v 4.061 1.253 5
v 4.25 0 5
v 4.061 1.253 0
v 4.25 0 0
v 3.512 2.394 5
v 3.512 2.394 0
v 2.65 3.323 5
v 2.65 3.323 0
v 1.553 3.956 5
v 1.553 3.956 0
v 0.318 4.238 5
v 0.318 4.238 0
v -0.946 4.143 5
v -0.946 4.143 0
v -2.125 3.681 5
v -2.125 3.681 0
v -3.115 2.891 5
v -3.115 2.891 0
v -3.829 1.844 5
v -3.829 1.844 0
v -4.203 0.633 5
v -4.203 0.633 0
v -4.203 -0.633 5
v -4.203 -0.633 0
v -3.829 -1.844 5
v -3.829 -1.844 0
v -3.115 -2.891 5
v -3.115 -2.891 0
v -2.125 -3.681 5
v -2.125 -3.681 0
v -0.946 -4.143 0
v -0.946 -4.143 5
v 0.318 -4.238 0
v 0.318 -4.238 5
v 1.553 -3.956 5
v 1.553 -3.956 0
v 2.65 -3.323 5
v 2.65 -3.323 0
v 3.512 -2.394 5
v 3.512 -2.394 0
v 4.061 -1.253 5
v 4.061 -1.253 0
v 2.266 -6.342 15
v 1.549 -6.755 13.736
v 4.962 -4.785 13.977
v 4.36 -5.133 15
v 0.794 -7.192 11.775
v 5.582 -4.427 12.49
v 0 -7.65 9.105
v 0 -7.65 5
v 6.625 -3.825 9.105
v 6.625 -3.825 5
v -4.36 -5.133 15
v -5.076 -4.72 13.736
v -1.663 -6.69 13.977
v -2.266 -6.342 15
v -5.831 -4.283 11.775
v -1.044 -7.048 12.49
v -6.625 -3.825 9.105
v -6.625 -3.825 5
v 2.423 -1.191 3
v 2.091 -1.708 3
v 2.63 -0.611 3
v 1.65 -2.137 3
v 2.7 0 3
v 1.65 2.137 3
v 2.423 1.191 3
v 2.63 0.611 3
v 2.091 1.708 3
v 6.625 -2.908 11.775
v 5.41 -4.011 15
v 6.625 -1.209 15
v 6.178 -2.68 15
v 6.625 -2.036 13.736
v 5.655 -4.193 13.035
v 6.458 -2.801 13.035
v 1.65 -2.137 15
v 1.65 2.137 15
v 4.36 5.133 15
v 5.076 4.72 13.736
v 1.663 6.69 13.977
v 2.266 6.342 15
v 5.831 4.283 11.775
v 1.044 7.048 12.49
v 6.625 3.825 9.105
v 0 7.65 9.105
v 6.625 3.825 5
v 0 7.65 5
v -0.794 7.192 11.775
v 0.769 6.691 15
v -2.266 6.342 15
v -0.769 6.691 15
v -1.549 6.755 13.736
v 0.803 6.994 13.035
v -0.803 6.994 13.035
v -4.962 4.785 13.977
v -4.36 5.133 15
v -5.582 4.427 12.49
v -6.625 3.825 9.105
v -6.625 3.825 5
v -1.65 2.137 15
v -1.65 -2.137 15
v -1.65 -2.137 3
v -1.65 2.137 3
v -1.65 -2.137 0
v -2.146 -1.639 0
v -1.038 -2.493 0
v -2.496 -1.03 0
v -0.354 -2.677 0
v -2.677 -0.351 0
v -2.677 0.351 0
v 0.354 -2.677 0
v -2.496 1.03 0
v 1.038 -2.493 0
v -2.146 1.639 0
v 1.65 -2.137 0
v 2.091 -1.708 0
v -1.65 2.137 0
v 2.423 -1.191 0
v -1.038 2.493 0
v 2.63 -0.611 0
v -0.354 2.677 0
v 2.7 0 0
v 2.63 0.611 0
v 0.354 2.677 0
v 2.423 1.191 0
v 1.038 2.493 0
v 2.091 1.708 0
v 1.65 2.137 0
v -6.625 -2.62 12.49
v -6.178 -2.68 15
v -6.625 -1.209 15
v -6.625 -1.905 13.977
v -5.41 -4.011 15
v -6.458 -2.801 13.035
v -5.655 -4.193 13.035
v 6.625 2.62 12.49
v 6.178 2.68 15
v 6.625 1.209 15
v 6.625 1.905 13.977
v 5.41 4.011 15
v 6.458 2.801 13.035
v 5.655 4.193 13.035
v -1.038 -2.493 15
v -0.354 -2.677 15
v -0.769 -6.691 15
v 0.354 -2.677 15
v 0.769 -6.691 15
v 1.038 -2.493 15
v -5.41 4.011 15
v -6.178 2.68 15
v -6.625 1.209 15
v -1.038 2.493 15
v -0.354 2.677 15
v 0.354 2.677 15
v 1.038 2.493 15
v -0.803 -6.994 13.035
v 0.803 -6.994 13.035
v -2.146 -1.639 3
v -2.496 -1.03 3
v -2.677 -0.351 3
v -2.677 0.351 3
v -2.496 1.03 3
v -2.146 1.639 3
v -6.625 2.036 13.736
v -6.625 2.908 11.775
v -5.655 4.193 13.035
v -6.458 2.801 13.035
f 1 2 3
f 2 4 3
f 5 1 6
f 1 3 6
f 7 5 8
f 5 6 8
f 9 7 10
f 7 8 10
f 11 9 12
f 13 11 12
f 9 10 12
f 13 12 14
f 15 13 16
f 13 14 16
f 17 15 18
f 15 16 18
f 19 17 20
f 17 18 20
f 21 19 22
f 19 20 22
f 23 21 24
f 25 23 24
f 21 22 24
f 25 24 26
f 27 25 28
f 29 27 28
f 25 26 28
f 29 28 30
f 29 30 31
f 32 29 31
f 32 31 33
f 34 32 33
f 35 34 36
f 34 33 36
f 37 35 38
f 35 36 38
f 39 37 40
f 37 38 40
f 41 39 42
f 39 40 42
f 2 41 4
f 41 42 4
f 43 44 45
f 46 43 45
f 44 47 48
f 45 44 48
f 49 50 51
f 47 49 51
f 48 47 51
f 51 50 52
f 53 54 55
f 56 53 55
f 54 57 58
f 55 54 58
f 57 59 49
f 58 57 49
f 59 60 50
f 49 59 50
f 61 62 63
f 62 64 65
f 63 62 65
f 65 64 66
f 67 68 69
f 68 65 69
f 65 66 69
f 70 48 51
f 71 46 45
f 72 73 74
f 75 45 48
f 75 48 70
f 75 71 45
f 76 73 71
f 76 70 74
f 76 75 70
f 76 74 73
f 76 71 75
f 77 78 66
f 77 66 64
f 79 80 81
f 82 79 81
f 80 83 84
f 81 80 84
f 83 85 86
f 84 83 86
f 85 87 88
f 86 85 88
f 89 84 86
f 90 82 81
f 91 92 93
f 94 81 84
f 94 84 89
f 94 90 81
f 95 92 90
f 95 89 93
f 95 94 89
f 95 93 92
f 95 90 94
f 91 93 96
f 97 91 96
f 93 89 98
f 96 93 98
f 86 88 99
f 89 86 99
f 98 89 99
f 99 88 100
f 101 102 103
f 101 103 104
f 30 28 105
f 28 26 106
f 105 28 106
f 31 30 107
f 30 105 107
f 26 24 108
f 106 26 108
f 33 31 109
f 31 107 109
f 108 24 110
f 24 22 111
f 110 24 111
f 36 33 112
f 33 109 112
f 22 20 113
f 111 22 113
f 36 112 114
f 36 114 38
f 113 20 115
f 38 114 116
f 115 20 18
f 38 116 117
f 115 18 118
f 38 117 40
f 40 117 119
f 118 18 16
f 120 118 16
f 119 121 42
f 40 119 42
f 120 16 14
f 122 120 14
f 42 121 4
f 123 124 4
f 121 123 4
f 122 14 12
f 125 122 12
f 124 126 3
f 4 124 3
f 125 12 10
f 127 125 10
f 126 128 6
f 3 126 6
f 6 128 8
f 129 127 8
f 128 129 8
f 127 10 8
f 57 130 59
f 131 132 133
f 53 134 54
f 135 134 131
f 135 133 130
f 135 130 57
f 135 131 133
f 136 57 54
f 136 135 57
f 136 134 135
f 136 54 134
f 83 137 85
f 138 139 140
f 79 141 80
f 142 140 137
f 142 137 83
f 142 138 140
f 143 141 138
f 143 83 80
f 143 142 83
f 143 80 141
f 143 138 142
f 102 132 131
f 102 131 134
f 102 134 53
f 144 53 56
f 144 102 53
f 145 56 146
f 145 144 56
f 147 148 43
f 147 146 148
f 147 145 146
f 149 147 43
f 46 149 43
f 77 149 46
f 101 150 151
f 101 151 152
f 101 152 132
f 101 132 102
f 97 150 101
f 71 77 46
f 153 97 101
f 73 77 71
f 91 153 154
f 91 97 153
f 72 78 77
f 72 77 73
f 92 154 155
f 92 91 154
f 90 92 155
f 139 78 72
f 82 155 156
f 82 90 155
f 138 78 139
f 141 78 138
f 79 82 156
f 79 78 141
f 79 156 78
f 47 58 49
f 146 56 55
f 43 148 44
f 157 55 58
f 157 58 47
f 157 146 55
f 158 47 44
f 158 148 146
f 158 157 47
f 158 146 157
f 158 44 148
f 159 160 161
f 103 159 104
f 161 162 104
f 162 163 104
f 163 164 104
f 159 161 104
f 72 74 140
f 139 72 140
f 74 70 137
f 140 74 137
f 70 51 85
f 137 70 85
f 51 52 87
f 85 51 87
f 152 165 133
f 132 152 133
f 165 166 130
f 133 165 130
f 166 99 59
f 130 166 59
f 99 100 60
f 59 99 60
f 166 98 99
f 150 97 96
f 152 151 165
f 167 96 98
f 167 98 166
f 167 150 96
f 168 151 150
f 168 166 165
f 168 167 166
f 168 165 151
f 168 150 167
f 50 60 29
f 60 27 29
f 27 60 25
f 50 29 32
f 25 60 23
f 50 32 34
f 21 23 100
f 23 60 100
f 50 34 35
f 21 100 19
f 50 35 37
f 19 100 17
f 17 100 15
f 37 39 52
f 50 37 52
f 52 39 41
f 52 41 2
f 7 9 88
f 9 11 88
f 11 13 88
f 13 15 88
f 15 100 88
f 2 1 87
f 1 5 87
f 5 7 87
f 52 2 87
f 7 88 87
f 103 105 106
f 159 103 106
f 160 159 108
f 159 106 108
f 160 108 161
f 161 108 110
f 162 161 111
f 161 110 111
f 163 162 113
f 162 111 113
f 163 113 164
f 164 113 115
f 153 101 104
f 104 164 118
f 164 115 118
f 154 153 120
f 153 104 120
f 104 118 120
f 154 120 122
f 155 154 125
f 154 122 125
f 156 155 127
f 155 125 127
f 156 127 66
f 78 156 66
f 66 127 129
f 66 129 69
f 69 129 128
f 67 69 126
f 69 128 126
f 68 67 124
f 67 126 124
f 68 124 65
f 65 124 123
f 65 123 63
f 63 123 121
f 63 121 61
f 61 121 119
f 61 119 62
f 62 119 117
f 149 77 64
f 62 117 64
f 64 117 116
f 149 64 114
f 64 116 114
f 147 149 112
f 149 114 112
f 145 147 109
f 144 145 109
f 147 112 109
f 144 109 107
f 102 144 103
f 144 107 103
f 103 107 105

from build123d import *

# Parameters (mm, degrees)
F0_R     = 4.25
F1_DEPTH = 3
F2_START = 3
F2_DEPTH = 2
F3_START = 5
F3_DEPTH = 10


with BuildPart() as f1:
    # F0 (on Top) → F1 (new body)
    with BuildSketch(Plane.XY):
        Circle(F0_R)
        with BuildLine():
            ThreePointArc((1.65, 2.1371710273), (2.4233241632, 1.19058809), (2.7, 0))
            ThreePointArc((2.7, 0), (2.4233241632, -1.19058809), (1.65, -2.1371710273))
            ThreePointArc((1.65, -2.1371710273), (0, -2.7), (-1.65, -2.1371710273))
            ThreePointArc((-1.65, -2.1371710273), (-2.7, 0), (-1.65, 2.1371710273))
            ThreePointArc((-1.65, 2.1371710273), (0, 2.7), (1.65, 2.1371710273))
        make_face(mode=Mode.SUBTRACT)
    extrude(amount=F1_DEPTH)

    # F0 (on Top) → F2 (join)
    with BuildSketch(Plane.XY.offset(F2_START)):
        Circle(F0_R)
        with BuildLine():
            ThreePointArc((1.65, 2.1371710273), (2.4233241632, 1.19058809), (2.7, 0))
            ThreePointArc((2.7, 0), (2.4233241632, -1.19058809), (1.65, -2.1371710273))
            ThreePointArc((1.65, -2.1371710273), (0, -2.7), (-1.65, -2.1371710273))
            ThreePointArc((-1.65, -2.1371710273), (-2.7, 0), (-1.65, 2.1371710273))
            ThreePointArc((-1.65, 2.1371710273), (0, 2.7), (1.65, 2.1371710273))
        make_face(mode=Mode.SUBTRACT)
        with BuildLine():
            Line((-1.65, -2.1371710273), (-1.65, 2.1371710273))
            ThreePointArc((-1.65, 2.1371710273), (-2.7, 0), (-1.65, -2.1371710273))
        make_face()
        with BuildLine():
            ThreePointArc((1.65, -2.1371710273), (2.4233241632, -1.19058809), (2.7, 0))
            ThreePointArc((2.7, 0), (2.4233241632, 1.19058809), (1.65, 2.1371710273))
            Line((1.65, 2.1371710273), (1.65, -2.1371710273))
        make_face()
    extrude(amount=F2_DEPTH)

    # F0 (on Top) → F3 (join)
    with BuildSketch(Plane.XY.offset(F3_START)):
        Polygon((-6.625094339, -3.825), (0, -7.65), (6.625094339, -3.825), (6.625094339, 3.825), (0, 7.65), (-6.625094339, 3.825), align=None)
        Circle(F0_R, mode=Mode.SUBTRACT)
        Circle(F0_R)
        with BuildLine():
            ThreePointArc((1.65, 2.1371710273), (2.4233241632, 1.19058809), (2.7, 0))
            ThreePointArc((2.7, 0), (2.4233241632, -1.19058809), (1.65, -2.1371710273))
            ThreePointArc((1.65, -2.1371710273), (0, -2.7), (-1.65, -2.1371710273))
            ThreePointArc((-1.65, -2.1371710273), (-2.7, 0), (-1.65, 2.1371710273))
            ThreePointArc((-1.65, 2.1371710273), (0, 2.7), (1.65, 2.1371710273))
        make_face(mode=Mode.SUBTRACT)
        with BuildLine():
            ThreePointArc((1.65, -2.1371710273), (2.4233241632, -1.19058809), (2.7, 0))
            ThreePointArc((2.7, 0), (2.4233241632, 1.19058809), (1.65, 2.1371710273))
            Line((1.65, 2.1371710273), (1.65, -2.1371710273))
        make_face()
        with BuildLine():
            Line((-1.65, -2.1371710273), (-1.65, 2.1371710273))
            ThreePointArc((-1.65, 2.1371710273), (-2.7, 0), (-1.65, -2.1371710273))
        make_face()
    extrude(amount=F3_DEPTH)

    # F4 (on Right) → F5 (revolve, cut)
    with BuildSketch(Plane.YZ):
        Polygon((-8.316071704, 4.8156171106), (-6.5929647535, 15.9113816917), (-8.316071704, 15.9113816917), align=None)
    revolve(axis=Axis((0, 0, 4.9219373614), (0, 0, 1)), mode=Mode.SUBTRACT)


solid = f1.part
